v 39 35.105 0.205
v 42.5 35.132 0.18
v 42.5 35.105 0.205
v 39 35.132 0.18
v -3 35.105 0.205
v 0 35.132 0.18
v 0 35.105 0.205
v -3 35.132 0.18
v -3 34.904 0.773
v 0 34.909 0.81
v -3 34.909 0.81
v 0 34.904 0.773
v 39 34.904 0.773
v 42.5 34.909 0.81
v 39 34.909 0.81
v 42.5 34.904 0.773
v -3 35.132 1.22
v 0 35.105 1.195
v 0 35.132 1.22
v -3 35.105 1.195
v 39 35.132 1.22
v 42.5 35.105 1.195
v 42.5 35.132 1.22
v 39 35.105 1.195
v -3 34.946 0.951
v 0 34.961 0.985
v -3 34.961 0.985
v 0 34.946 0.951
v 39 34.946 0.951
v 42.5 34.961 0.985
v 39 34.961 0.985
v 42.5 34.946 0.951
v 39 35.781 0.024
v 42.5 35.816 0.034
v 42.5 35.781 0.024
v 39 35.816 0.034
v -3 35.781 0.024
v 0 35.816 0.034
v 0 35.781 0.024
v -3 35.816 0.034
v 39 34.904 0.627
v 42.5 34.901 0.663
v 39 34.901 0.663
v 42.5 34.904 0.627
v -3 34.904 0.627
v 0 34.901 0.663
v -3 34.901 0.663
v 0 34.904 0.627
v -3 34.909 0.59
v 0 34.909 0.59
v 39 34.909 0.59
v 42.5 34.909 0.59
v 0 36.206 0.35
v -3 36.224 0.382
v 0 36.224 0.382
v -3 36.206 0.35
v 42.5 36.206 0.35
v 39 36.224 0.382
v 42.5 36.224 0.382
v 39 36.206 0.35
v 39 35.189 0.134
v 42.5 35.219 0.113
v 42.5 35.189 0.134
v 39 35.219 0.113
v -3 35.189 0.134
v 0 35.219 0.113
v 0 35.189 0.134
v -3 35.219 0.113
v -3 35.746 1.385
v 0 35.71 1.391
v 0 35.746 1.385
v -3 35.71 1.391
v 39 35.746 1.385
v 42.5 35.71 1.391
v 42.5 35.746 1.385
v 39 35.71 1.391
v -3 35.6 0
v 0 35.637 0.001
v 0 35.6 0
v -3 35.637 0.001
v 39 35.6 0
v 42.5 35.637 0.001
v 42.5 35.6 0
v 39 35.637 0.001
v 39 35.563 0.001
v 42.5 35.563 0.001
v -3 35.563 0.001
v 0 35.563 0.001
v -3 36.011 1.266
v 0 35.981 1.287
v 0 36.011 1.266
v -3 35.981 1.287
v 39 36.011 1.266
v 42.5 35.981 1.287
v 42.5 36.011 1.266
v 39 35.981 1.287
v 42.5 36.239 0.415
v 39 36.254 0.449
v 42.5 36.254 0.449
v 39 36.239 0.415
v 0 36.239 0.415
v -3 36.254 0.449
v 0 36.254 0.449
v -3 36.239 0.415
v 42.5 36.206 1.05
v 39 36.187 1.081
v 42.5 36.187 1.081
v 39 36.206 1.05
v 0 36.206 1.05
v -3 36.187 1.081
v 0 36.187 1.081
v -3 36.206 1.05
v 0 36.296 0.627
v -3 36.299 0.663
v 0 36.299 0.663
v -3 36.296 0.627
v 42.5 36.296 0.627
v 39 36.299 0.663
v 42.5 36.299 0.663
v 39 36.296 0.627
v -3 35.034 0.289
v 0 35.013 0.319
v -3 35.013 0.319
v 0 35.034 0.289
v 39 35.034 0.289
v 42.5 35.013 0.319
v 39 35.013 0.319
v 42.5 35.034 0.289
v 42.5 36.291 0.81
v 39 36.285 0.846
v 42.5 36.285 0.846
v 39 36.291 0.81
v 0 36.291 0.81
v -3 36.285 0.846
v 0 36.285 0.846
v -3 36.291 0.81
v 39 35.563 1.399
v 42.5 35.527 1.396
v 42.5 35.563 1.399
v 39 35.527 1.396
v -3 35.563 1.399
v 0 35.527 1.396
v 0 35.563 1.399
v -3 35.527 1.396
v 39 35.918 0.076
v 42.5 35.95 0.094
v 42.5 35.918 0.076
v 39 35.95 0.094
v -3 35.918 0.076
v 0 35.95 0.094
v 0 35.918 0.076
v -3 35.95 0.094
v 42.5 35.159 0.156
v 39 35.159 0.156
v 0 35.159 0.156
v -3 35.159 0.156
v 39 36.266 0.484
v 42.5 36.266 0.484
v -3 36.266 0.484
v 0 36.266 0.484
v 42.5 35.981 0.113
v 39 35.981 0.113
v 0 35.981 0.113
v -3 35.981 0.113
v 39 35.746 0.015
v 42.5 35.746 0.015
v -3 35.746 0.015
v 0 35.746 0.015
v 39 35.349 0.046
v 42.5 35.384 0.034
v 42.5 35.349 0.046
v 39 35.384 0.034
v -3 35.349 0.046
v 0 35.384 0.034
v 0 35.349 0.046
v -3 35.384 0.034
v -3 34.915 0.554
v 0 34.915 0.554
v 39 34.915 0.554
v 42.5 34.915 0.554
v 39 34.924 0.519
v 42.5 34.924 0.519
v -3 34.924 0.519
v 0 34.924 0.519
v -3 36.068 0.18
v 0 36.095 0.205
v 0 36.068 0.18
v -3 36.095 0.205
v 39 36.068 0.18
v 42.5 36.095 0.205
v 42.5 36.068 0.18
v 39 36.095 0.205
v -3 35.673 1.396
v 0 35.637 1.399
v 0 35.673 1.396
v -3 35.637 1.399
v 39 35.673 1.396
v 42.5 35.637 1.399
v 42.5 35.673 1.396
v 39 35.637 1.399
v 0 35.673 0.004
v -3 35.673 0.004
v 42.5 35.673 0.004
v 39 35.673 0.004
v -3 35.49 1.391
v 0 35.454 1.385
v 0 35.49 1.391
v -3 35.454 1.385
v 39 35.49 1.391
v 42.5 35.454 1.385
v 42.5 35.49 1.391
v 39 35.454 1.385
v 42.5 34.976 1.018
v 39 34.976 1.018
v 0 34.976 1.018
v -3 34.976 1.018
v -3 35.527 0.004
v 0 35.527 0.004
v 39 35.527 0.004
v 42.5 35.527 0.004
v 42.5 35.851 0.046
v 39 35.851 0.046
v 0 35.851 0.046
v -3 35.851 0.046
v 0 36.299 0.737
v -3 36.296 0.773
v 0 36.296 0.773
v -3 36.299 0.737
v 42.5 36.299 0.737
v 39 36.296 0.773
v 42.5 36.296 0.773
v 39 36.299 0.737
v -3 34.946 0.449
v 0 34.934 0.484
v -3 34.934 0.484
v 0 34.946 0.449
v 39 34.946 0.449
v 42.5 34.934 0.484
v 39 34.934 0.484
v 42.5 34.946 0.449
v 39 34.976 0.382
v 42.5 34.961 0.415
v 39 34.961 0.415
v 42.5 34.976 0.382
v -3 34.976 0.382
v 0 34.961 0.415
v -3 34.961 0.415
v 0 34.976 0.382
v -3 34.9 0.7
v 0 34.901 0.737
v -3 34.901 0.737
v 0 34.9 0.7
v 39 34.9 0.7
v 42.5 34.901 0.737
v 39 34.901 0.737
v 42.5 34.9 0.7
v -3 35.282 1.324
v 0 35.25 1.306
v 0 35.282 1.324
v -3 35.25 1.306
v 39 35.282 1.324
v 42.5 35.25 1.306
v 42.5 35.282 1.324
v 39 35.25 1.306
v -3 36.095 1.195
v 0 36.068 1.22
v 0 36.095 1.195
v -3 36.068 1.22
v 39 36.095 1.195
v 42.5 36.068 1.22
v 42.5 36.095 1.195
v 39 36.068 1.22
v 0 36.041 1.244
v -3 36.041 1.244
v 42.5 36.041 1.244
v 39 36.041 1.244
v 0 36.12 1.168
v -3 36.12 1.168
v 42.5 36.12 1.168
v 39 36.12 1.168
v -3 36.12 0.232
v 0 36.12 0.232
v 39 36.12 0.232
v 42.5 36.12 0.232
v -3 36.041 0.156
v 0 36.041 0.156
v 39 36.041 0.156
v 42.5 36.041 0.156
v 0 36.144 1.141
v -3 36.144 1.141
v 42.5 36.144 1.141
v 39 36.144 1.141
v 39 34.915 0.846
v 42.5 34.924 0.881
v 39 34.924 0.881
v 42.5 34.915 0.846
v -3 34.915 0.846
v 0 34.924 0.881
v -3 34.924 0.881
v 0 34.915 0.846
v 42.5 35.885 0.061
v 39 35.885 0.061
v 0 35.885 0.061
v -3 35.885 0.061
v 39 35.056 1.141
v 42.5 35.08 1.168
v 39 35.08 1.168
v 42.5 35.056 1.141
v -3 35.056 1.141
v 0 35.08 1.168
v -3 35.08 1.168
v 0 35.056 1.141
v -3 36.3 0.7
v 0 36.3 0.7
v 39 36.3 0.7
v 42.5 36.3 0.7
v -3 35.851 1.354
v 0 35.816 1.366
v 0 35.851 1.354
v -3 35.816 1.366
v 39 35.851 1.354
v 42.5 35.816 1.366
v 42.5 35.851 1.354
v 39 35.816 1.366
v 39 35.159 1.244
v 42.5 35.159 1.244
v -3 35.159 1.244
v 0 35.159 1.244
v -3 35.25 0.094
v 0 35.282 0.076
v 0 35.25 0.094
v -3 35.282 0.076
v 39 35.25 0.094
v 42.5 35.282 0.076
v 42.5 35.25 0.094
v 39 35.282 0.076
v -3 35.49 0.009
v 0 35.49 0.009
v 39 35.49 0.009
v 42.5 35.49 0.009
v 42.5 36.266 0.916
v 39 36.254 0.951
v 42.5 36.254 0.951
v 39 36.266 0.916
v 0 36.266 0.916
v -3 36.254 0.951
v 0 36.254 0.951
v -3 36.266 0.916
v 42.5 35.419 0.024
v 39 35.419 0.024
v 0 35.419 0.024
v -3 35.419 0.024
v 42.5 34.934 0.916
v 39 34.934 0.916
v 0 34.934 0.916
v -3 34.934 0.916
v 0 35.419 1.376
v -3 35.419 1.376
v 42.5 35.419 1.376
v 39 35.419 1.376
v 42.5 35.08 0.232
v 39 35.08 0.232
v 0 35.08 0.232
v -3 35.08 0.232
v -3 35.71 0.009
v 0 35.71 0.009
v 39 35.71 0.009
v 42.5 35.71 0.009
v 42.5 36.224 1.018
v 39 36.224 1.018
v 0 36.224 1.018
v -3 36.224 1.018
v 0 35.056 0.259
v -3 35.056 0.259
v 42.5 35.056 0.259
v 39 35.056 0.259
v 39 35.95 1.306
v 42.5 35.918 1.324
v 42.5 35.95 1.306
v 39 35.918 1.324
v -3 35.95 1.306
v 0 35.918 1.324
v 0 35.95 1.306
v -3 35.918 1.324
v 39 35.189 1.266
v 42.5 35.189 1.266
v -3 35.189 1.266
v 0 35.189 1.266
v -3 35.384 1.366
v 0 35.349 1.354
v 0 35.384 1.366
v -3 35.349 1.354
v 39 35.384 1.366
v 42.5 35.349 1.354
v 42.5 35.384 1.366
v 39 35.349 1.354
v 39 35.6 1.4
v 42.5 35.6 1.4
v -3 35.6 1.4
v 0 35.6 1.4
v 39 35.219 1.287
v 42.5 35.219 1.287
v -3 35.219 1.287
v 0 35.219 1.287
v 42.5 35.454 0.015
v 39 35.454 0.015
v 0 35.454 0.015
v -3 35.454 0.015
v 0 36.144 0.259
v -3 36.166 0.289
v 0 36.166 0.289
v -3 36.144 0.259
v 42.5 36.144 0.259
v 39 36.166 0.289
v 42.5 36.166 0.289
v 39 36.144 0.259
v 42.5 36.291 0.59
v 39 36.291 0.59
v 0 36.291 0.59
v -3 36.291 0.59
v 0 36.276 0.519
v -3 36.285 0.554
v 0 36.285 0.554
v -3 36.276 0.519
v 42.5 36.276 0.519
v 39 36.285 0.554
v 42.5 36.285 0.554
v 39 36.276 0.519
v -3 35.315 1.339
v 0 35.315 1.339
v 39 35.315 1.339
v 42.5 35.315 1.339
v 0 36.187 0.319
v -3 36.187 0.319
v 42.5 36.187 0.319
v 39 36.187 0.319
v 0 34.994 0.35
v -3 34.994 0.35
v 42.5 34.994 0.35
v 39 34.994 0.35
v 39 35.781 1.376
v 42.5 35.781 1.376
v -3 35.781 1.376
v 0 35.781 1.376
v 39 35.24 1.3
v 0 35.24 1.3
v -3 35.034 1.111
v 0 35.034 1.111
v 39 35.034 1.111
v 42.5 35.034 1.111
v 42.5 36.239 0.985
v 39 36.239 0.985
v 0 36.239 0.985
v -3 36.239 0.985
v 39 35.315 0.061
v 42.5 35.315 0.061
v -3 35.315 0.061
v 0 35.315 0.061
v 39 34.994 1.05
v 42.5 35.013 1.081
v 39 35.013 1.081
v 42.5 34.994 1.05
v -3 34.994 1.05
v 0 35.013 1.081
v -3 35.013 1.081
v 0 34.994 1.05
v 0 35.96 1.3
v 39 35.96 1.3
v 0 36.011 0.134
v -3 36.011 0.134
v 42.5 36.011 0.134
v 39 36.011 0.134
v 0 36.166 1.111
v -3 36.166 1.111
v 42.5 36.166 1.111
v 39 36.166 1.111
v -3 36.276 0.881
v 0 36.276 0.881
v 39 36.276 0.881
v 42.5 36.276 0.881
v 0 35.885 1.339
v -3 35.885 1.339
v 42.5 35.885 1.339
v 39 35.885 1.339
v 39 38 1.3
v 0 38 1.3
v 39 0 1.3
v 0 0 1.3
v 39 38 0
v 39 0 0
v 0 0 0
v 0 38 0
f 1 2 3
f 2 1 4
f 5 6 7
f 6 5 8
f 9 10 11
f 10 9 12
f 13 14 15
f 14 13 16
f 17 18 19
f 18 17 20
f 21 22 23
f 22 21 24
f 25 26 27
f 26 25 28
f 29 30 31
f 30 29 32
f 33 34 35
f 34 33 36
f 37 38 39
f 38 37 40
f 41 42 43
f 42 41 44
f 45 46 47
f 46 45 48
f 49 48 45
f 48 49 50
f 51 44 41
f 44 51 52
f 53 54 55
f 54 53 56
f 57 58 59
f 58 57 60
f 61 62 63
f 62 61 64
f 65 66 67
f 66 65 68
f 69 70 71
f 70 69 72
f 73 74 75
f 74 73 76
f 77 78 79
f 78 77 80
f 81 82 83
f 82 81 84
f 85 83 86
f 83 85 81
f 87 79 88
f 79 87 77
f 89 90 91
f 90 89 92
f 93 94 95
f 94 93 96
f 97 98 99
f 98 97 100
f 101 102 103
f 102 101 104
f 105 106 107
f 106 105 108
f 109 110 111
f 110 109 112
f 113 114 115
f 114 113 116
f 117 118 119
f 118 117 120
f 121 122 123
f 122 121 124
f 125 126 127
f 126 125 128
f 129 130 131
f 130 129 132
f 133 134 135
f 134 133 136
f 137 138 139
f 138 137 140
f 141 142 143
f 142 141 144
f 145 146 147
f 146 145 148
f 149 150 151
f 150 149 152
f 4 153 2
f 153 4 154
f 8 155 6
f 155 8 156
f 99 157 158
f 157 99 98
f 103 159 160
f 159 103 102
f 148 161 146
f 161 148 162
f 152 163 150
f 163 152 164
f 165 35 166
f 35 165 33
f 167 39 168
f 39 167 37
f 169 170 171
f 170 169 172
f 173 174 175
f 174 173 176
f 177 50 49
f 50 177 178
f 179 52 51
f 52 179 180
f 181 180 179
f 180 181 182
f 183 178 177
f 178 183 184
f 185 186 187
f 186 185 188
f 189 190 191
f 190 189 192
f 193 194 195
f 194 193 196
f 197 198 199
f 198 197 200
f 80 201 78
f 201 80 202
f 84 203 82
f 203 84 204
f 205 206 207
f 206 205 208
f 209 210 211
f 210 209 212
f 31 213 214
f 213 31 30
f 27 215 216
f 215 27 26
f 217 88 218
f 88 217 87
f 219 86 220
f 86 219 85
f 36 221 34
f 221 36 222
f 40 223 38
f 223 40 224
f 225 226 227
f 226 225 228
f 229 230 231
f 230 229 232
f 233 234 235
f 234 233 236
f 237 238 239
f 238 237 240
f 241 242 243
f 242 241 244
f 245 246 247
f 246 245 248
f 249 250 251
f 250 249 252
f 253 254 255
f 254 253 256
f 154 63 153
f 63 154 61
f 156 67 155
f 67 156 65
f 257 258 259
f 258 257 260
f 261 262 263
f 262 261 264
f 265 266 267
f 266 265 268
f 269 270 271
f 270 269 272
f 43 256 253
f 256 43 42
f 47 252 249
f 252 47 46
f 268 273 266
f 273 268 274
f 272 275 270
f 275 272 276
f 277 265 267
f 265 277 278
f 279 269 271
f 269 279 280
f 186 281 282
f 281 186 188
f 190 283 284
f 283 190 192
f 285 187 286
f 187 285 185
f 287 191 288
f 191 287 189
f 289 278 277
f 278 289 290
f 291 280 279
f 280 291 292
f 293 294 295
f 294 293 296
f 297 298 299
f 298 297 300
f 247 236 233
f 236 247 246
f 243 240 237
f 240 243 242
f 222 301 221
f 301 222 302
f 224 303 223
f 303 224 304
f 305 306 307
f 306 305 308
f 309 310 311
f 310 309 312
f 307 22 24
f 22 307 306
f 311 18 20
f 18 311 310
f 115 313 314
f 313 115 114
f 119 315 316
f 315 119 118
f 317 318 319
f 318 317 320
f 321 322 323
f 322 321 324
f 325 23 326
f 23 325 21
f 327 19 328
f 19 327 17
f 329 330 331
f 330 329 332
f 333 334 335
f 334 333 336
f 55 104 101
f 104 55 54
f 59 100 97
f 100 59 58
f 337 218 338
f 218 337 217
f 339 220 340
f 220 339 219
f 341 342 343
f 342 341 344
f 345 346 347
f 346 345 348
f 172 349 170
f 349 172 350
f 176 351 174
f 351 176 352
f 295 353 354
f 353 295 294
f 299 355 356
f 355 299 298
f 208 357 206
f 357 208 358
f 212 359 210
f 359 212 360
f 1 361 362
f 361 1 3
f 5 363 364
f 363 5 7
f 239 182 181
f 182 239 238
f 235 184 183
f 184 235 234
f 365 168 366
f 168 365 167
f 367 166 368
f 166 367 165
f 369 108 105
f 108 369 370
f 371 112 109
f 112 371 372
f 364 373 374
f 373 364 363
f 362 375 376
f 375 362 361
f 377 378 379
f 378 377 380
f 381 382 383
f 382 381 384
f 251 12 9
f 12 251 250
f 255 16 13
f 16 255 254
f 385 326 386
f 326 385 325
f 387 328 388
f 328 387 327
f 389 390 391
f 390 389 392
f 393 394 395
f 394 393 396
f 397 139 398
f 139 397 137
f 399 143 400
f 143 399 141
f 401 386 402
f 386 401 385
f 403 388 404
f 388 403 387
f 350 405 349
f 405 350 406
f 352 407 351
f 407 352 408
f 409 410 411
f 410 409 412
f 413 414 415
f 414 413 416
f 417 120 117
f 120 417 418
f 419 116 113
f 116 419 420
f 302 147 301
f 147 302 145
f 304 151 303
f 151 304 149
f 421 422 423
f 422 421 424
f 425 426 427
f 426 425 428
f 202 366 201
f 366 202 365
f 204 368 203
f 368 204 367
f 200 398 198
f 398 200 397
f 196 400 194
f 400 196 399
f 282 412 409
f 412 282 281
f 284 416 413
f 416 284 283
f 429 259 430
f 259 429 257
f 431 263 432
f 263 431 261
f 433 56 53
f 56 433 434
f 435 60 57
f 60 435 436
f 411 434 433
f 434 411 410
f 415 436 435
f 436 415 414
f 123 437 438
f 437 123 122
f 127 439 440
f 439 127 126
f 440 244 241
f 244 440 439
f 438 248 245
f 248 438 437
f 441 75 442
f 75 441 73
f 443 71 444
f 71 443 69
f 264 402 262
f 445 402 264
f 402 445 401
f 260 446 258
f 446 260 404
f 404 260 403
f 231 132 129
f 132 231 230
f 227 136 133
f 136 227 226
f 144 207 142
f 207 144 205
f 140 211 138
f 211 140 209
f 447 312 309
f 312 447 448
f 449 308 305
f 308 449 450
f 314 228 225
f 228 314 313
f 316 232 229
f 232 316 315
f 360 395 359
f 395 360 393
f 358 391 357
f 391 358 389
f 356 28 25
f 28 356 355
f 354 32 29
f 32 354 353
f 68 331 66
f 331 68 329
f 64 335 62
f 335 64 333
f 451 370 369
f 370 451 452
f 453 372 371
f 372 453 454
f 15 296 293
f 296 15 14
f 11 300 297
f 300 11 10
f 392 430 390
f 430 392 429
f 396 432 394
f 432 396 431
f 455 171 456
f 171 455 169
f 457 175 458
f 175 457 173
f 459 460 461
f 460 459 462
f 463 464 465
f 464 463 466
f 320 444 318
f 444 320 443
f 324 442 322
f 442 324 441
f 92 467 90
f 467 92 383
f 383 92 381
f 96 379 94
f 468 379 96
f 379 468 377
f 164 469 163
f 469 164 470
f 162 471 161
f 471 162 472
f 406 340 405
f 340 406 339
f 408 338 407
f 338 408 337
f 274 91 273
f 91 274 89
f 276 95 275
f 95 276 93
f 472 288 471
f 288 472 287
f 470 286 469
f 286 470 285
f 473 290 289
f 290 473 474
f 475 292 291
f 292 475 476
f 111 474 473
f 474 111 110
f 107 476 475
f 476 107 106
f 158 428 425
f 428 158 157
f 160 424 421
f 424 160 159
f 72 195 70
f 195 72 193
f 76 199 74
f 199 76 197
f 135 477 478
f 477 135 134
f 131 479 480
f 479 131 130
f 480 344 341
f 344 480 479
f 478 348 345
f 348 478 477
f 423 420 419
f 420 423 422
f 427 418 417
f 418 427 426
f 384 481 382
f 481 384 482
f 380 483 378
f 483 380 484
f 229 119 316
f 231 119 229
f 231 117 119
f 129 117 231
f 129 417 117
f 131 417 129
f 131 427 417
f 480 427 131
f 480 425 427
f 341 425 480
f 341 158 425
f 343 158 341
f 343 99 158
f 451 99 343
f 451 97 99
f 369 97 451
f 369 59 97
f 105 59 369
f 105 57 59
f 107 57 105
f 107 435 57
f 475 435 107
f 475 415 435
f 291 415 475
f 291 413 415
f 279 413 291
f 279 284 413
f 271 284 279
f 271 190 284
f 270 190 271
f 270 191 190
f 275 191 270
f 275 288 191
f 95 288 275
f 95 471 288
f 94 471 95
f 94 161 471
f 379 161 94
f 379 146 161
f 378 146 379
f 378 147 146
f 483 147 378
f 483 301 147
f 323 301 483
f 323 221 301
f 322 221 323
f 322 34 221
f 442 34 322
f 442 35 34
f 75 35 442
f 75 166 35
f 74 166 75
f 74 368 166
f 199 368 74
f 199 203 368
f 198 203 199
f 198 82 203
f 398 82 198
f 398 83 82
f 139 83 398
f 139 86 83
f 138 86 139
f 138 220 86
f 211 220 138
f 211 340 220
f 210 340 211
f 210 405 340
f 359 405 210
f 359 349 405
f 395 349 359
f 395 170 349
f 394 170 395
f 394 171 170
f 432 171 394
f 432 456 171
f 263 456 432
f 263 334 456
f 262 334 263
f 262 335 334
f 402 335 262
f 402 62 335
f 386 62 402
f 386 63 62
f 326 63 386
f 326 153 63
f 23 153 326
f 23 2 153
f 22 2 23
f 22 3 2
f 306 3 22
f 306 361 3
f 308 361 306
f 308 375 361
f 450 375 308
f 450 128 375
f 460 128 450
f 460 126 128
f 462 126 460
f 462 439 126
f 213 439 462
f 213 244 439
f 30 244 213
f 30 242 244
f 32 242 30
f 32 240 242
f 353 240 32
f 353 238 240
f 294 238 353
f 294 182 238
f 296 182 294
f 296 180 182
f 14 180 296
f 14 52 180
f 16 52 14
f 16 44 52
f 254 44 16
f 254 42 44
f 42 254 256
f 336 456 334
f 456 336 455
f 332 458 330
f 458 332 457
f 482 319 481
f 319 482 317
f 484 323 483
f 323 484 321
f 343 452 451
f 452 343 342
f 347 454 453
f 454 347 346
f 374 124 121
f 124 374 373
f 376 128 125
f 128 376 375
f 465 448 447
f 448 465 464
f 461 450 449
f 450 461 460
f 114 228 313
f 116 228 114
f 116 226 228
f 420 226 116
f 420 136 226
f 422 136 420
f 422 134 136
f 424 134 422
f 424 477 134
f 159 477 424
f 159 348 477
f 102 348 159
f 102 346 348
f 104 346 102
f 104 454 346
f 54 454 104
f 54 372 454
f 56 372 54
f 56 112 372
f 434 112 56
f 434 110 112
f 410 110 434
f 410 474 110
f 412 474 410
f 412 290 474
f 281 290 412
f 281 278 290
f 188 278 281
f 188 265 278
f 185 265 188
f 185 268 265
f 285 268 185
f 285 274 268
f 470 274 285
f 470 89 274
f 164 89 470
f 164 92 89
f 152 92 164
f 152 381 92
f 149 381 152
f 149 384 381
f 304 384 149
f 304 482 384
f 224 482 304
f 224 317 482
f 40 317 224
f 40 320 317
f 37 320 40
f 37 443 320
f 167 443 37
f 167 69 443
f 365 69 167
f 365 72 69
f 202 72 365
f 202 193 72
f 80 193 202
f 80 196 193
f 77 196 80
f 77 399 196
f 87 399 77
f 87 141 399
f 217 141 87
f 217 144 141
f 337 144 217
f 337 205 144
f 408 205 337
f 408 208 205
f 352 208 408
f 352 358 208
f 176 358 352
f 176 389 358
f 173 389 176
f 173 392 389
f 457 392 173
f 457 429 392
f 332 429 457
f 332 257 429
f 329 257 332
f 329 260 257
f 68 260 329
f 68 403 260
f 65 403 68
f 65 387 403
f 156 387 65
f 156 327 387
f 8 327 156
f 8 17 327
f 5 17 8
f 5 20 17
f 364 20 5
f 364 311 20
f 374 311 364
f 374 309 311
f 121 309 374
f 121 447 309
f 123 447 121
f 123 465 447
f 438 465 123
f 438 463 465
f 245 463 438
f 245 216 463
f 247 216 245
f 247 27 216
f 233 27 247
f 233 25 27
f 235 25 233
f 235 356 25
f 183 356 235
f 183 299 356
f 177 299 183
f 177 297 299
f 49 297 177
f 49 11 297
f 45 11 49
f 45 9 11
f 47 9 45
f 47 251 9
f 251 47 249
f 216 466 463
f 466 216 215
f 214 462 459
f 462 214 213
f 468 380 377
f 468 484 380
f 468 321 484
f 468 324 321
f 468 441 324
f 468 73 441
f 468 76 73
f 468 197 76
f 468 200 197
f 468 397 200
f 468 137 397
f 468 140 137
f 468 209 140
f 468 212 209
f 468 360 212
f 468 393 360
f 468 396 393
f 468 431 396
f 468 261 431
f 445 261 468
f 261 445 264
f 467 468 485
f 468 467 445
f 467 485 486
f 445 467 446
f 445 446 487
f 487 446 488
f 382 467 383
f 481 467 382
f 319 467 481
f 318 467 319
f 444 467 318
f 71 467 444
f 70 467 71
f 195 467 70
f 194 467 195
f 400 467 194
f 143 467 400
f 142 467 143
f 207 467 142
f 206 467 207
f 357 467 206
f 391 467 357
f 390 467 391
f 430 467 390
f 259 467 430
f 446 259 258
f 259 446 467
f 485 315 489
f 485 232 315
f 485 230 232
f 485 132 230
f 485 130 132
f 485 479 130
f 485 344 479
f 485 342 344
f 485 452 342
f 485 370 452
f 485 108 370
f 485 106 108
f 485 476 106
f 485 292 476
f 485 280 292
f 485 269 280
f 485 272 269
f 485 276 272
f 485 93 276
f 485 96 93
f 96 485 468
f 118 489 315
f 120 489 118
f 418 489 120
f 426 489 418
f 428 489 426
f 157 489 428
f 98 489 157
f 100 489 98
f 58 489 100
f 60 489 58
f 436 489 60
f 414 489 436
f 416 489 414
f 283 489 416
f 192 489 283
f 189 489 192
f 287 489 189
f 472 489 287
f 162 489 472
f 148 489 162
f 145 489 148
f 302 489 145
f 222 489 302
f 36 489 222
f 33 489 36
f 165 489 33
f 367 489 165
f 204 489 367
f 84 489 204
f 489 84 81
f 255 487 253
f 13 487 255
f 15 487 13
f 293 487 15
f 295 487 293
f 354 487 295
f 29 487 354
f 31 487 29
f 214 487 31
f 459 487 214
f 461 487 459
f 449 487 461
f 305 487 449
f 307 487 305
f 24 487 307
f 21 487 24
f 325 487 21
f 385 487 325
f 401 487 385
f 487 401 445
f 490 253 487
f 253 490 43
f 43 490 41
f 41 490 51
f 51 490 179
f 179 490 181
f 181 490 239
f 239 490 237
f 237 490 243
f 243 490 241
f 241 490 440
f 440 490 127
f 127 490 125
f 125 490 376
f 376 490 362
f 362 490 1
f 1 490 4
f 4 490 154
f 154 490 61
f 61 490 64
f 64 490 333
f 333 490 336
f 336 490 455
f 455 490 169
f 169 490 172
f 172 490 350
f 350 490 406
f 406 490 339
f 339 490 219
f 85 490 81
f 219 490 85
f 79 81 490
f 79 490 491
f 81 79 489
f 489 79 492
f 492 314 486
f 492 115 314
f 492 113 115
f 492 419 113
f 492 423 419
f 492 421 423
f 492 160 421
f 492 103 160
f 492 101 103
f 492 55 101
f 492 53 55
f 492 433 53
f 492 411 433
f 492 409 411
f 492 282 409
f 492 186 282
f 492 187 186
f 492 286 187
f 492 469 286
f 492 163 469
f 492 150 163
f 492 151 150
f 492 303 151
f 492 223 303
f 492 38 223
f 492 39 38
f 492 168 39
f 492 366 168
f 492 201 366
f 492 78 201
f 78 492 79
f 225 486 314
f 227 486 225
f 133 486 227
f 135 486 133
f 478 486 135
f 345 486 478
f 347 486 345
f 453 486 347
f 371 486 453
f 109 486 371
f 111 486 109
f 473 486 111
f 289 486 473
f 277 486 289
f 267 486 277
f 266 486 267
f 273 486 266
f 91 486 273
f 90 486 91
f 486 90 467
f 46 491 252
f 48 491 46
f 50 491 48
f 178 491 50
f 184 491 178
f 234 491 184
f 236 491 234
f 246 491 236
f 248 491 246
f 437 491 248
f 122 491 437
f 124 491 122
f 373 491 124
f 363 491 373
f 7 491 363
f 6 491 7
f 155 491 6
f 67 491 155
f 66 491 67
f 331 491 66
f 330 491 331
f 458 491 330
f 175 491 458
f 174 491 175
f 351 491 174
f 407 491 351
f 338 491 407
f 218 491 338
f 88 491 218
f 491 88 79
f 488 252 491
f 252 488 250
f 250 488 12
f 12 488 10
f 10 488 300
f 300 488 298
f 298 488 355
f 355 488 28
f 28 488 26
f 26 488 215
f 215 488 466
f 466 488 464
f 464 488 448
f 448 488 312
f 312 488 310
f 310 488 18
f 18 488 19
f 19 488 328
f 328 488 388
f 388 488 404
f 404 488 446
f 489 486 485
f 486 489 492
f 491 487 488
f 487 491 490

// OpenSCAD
echo(version=version());

my_nbfaces=120;

letter_size = 40;
letter_height = 5;
letter_footprint = 0.2;

card_thickness = 1.3;
card_width = 39.5;
card_height = 38;

wheel_thickness = 2.5;
hole_radius = 1.2;
slack = 0.5;

difference() {
    union() 
    {
        /* main surface */
        cube([card_width - slack, card_height, card_thickness]);

        difference() {
            translate([-wheel_thickness - slack, card_height - 2.4, hole_radius - slack]) {
                rotate([0, 90, 0]) {
                    cylinder(h=card_width + 2 * wheel_thickness + 2 * slack, r= hole_radius - slack, $fn=my_nbfaces);
                }
            }
            
            translate([0, 0, card_thickness])
                cube([card_width - slack, card_height, card_thickness]);
        }
    }
}
